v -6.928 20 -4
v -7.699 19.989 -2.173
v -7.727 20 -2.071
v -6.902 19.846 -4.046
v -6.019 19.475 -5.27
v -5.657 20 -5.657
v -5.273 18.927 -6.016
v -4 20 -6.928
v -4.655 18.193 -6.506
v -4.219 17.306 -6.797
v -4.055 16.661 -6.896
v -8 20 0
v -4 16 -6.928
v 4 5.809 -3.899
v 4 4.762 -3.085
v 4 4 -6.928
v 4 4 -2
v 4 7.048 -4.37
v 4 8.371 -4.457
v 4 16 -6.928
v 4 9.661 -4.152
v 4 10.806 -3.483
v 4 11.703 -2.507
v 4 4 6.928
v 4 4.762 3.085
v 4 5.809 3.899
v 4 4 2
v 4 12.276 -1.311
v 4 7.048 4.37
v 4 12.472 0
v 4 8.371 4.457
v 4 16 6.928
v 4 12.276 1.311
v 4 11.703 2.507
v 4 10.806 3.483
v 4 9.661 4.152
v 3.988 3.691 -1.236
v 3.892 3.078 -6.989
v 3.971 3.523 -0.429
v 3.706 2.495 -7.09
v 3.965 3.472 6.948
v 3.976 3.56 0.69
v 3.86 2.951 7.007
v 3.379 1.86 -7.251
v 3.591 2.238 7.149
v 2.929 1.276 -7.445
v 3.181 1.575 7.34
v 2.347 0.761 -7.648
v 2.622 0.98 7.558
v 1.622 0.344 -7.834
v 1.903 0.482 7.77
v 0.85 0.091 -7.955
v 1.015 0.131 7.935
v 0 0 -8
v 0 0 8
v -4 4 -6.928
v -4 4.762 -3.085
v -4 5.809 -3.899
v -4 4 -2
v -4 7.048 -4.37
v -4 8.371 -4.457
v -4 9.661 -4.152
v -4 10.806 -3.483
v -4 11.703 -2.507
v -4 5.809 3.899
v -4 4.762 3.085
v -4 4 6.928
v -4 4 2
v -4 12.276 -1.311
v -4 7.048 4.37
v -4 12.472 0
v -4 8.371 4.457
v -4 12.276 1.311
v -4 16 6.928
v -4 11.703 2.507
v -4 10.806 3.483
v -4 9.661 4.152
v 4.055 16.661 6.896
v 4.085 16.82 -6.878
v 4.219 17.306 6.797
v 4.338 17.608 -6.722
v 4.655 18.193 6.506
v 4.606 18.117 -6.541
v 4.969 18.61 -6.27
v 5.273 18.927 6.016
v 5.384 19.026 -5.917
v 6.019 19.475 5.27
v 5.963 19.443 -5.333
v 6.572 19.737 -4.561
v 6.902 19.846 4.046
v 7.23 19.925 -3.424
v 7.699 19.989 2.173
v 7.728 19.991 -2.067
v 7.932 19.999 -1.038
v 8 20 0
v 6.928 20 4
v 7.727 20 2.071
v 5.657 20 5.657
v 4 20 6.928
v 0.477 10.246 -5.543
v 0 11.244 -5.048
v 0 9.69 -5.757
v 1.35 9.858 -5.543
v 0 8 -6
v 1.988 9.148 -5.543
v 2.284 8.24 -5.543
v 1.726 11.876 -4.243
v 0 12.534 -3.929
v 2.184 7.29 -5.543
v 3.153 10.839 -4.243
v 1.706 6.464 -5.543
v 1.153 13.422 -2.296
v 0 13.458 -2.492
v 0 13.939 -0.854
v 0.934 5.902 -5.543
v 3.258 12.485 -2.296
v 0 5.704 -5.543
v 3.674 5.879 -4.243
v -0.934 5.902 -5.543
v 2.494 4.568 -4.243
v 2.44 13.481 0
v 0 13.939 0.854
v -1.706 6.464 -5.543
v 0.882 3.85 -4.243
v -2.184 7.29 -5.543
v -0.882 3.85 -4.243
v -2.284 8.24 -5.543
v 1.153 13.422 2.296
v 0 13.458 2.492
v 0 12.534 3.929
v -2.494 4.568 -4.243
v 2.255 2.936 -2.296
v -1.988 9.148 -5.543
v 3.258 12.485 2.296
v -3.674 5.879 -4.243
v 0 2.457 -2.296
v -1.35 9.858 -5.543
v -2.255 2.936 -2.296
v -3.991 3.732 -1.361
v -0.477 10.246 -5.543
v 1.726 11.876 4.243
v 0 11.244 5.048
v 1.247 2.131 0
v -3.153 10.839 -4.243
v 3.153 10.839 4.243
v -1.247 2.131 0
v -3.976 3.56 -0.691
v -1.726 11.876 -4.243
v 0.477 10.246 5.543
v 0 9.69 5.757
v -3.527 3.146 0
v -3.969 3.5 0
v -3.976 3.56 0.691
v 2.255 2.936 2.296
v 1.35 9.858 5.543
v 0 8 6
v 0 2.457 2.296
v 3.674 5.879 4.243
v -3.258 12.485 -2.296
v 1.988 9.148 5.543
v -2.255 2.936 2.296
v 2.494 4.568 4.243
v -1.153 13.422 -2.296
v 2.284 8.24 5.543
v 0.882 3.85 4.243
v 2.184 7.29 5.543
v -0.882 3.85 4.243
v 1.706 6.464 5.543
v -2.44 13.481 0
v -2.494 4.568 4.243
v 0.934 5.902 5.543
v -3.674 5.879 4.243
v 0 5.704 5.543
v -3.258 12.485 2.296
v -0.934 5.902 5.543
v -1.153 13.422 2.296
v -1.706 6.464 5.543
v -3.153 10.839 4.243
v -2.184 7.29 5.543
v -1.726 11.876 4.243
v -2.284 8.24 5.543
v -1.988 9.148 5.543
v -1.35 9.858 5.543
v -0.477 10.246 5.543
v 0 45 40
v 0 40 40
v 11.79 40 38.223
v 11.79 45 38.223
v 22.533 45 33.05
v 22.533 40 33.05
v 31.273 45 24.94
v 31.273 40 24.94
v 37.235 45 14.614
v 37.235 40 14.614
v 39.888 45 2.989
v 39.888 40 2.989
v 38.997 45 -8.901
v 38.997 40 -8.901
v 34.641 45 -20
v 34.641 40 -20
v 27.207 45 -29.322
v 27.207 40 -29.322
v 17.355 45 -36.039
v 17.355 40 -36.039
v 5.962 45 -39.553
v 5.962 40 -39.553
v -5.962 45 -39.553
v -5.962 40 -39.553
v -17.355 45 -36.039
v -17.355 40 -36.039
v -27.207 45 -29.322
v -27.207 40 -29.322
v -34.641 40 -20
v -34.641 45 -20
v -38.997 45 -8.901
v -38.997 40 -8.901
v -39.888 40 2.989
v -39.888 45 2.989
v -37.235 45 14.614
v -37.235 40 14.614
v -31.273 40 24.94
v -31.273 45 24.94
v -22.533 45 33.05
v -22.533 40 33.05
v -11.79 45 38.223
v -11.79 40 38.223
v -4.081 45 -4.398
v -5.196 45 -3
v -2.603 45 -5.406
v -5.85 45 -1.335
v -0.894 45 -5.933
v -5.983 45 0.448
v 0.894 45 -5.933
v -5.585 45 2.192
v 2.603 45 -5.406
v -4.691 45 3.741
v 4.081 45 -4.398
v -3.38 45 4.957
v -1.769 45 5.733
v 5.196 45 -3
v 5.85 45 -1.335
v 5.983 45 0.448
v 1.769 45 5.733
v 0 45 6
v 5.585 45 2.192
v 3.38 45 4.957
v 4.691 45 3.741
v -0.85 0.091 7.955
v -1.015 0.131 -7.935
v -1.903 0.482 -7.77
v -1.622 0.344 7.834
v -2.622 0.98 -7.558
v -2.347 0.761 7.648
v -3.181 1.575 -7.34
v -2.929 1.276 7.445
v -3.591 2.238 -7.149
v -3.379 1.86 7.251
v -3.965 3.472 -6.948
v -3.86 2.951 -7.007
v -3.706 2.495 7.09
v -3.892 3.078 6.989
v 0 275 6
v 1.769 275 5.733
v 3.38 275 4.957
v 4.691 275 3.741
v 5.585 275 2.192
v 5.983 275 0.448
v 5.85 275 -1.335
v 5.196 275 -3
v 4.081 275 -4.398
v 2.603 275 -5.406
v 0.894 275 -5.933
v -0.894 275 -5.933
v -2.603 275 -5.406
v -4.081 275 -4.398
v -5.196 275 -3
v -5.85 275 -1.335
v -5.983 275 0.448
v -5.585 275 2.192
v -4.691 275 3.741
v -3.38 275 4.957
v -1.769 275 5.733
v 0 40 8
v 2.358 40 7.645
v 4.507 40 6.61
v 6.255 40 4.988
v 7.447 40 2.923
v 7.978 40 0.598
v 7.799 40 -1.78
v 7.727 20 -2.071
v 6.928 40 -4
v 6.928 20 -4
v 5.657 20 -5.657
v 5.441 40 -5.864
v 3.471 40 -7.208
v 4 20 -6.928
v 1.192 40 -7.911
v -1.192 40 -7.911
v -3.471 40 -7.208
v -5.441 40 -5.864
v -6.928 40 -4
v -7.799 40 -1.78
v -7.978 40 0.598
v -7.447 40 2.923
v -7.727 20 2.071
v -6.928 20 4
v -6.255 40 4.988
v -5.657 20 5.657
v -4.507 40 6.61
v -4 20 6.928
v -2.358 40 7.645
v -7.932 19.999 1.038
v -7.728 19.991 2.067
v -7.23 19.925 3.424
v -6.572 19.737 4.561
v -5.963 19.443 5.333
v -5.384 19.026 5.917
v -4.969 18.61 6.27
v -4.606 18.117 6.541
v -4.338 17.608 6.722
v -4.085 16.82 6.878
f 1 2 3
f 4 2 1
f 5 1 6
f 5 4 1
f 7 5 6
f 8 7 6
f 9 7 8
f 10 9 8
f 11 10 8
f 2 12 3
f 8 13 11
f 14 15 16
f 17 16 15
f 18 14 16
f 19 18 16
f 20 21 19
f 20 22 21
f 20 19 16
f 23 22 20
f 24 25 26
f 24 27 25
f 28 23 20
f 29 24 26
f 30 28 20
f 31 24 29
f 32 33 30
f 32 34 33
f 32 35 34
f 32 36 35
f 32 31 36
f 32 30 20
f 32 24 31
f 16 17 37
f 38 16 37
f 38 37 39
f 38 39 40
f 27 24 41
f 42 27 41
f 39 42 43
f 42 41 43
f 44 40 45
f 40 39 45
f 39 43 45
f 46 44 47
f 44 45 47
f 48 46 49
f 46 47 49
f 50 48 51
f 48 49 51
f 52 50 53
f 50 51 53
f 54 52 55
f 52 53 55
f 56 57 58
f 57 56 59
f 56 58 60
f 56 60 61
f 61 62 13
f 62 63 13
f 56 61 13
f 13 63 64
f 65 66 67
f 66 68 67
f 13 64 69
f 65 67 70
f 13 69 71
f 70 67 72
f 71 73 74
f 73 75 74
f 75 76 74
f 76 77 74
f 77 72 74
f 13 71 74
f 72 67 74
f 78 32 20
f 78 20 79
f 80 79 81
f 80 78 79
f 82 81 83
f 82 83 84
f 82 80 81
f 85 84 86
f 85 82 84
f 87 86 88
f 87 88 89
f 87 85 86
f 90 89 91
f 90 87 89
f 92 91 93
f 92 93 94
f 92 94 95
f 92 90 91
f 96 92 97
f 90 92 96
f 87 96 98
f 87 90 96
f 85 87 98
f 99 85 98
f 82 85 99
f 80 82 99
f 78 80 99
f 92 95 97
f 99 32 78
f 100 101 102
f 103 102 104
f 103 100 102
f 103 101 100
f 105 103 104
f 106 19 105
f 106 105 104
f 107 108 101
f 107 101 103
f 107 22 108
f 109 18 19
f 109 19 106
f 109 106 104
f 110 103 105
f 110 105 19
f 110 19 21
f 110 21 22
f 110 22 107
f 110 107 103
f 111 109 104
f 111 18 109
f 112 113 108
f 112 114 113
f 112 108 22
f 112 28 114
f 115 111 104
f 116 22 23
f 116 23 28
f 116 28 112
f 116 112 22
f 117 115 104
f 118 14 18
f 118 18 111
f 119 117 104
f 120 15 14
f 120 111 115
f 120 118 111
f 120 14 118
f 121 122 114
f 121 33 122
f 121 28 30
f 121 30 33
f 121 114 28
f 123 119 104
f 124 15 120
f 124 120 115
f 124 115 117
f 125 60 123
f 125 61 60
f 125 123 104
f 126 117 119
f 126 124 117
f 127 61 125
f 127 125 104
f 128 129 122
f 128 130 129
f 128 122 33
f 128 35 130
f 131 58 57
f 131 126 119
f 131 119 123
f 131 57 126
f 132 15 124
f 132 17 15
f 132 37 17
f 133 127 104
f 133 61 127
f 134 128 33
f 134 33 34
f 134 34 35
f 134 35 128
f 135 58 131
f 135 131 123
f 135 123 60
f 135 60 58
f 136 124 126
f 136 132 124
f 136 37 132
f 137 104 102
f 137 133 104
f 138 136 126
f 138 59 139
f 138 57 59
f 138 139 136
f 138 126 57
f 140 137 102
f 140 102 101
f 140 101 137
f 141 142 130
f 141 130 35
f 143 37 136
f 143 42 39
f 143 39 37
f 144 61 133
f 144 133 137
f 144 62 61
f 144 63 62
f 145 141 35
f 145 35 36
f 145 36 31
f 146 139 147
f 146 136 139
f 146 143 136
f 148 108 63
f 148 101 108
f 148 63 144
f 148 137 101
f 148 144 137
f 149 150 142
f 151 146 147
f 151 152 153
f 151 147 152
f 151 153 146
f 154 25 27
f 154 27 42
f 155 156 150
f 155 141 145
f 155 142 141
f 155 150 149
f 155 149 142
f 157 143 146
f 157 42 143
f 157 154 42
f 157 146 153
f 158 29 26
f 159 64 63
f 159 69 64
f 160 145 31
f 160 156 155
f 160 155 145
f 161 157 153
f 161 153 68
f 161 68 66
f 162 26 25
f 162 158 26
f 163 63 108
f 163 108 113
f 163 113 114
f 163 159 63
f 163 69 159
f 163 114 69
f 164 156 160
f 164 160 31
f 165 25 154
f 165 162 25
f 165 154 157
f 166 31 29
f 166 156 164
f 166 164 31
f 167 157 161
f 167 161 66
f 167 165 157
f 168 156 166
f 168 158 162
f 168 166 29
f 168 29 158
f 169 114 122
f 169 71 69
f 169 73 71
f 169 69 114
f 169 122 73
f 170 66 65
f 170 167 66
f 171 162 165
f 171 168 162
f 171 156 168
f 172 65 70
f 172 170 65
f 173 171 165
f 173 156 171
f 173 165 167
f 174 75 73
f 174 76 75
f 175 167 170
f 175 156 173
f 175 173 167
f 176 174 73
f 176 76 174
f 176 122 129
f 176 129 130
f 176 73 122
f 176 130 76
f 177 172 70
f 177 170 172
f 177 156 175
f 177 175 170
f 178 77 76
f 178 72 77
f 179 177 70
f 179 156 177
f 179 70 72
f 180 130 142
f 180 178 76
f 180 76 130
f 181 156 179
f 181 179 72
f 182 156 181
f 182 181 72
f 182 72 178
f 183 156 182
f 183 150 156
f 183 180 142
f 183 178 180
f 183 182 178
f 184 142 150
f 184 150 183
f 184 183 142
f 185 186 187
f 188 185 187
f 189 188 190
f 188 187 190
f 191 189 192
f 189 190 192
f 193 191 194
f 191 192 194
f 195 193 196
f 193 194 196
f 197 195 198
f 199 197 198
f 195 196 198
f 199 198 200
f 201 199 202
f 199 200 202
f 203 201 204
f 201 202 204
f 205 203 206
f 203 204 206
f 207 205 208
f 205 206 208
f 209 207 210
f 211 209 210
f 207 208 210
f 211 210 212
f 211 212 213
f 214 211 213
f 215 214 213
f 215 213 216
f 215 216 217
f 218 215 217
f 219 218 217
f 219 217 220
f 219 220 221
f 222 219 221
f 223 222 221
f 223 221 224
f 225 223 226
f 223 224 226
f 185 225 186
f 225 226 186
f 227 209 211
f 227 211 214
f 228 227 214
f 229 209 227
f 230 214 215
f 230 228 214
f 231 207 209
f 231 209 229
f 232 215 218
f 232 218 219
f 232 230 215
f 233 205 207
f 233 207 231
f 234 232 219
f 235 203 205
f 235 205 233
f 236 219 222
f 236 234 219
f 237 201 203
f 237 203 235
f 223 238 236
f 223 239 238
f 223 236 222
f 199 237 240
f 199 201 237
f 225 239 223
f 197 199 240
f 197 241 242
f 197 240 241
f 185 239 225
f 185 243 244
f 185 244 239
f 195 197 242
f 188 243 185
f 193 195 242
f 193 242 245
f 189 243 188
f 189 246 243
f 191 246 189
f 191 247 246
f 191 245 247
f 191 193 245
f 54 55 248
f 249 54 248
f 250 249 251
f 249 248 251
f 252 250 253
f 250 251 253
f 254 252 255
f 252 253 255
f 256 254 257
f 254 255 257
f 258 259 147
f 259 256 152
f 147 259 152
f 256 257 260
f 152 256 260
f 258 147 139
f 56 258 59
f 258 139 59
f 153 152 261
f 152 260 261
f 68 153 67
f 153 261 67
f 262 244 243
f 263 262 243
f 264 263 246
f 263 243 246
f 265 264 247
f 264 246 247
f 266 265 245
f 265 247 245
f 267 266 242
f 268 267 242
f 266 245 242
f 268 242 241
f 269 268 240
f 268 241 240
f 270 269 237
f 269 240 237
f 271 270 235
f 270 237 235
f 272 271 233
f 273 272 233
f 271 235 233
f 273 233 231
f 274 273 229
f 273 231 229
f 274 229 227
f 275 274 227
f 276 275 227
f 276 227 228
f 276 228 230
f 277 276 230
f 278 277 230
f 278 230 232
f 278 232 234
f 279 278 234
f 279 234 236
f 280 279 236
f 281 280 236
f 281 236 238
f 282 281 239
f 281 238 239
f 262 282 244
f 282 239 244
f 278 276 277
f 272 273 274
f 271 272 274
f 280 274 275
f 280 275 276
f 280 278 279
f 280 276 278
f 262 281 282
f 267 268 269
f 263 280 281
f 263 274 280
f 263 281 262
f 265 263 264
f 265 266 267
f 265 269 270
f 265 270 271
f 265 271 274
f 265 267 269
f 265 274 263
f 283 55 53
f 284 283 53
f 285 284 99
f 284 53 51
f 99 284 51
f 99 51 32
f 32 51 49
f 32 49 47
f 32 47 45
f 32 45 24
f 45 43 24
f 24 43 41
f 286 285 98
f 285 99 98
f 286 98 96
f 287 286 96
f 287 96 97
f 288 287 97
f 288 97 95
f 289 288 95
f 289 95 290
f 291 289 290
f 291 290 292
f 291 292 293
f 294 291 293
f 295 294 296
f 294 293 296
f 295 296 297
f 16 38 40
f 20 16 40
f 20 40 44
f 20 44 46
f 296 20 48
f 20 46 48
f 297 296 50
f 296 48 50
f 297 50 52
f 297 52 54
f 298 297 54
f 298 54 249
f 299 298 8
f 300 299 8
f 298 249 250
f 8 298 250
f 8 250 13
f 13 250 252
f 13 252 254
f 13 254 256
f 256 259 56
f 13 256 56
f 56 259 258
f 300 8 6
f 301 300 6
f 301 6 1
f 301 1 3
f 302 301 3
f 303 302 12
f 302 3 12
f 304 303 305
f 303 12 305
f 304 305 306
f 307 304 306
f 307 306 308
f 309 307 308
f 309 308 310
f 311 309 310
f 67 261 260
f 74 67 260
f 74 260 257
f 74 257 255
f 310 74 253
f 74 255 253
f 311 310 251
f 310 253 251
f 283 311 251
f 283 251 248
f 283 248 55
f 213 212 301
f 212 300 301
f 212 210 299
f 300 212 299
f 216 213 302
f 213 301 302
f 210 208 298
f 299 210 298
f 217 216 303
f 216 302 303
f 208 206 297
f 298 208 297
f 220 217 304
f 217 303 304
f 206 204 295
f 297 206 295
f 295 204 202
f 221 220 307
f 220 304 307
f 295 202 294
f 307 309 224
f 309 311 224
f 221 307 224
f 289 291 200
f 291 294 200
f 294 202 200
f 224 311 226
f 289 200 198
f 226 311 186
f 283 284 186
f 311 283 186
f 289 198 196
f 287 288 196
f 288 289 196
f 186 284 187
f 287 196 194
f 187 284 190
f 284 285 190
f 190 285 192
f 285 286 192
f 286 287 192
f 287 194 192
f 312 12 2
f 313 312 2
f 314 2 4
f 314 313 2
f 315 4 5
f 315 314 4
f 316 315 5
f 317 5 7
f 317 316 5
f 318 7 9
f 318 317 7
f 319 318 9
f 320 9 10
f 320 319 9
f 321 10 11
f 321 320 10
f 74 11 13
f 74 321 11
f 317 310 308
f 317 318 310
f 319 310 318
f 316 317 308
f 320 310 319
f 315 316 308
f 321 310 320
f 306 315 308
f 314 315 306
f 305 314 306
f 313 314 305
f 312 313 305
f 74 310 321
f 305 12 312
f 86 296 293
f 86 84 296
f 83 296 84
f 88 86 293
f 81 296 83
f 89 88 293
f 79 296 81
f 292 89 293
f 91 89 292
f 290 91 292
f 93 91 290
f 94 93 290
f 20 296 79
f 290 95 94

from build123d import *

# Parameters (mm, degrees)
SCHIZZO1_R                   = 8
ESTRUSIONE_ESTRUSIONE1_DEPTH = 40
SCHIZZO2_R                   = 40
ESTRUSIONE_ESTRUSIONE2_DEPTH = 5
SCHIZZO3_R                   = 6
ESTRUSIONE_ESTRUSIONE3_DEPTH = 230
SCHIZZO4_W                   = 4
SCHIZZO4_H                   = 20
TAGLIO_ESTRUSIONE1_DEPTH     = 281.757902827
RACCORDO1_R                  = 4


with BuildPart() as part:
    # Schizzo1 → Estrusione-Estrusione1 (new body)
    with BuildSketch(Plane(origin=(0, 0, 0), x_dir=(1, 0, 0), z_dir=(0, 1, 0))):
        with Locations(Location((0, 0, 0), (0, 0, 270))):
            Circle(SCHIZZO1_R)
    extrude(amount=ESTRUSIONE_ESTRUSIONE1_DEPTH)

    # Schizzo2 → Estrusione-Estrusione2 (add)
    with BuildSketch(Plane(origin=(0, 40, 0), x_dir=(1, 0, 0), z_dir=(0, 1, 0))):
        with Locations(Location((0, 0, 0), (0, 0, 270))):
            Circle(SCHIZZO2_R)
    extrude(amount=ESTRUSIONE_ESTRUSIONE2_DEPTH)

    # Schizzo3 → Estrusione-Estrusione3 (add)
    with BuildSketch(Plane(origin=(0, 45, 0), x_dir=(1, 0, 0), z_dir=(0, 1, 0))):
        with Locations(Location((0, 0, 0), (0, 0, 270))):
            Circle(SCHIZZO3_R)
    extrude(amount=ESTRUSIONE_ESTRUSIONE3_DEPTH)

    # Schizzo4 → Taglio-Estrusione1 (cut, symmetric)
    with BuildSketch(Plane.XY):
        with Locations((6, 10)):
            Rectangle(SCHIZZO4_W, SCHIZZO4_H)
    taglio_estrusione1 = extrude(amount=TAGLIO_ESTRUSIONE1_DEPTH, both=True, mode=Mode.SUBTRACT)

    # Specchia1: Taglio-Estrusione1 across plane
    add(taglio_estrusione1.mirror(Plane(origin=(0, 0, 0), x_dir=(0, 0, 1), z_dir=(1, 0, 0))), mode=Mode.SUBTRACT)


with BuildPart() as body_2:
    # Schizzo5 → Rivoluzione1 (revolve)
    with BuildSketch(Plane(origin=(0, 0, 0), x_dir=(0, 0, -1), z_dir=(1, 0, 0))):
        with BuildLine():
            Line((-6, 8), (6, 8))
            ThreePointArc((6, 8), (0, 14), (-6, 8))
        make_face()
    revolve(axis=Axis((0, 8, 6), (0, 0, -1)))


with BuildPart() as part_1:
    add(part.part)

    # Abbina1: cut body 2
    add(body_2.part, mode=Mode.SUBTRACT)

    # Raccordo1
    # the kernel refuses this fillet: 4 mm, written as the material it adds along each edge
    with BuildSketch(Plane(origin=(4, 20, 16.92820323), x_dir=(0, -1, 0), z_dir=(0, 0, -1))) as raccordo1_piece_1_section:
        with BuildLine():
            CenterArc((RACCORDO1_R, -RACCORDO1_R), RACCORDO1_R, 90, 90)
            Line((0, -RACCORDO1_R), (0, 0))
            Line((0, 0), (RACCORDO1_R, 0))
        make_face()
    raccordo1_piece_1 = extrude(amount=33.856406461, mode=Mode.PRIVATE)
    raccordo1_piece_1 = raccordo1_piece_1 & Plane(origin=(0, 19.029808041, 0), x_dir=(0, 0, 1), z_dir=(0, -1, 0)) * Cylinder(8, 84, mode=Mode.PRIVATE)
    add(raccordo1_piece_1)
    with BuildSketch(Plane(origin=(-4, 20, 16.92820323), x_dir=(0, -1, 0), z_dir=(0, 0, -1))) as raccordo1_piece_2_section:
        with BuildLine():
            CenterArc((RACCORDO1_R, RACCORDO1_R), RACCORDO1_R, 180, 90)
            Line((0, RACCORDO1_R), (0, 0))
            Line((0, 0), (RACCORDO1_R, 0))
        make_face()
    raccordo1_piece_2 = extrude(amount=33.856406461, mode=Mode.PRIVATE)
    raccordo1_piece_2 = raccordo1_piece_2 & Plane(origin=(0, 19.029808041, 0), x_dir=(0, 0, 1), z_dir=(0, -1, 0)) * Cylinder(8, 84, mode=Mode.PRIVATE)
    add(raccordo1_piece_2)
    # the kernel refuses this fillet: 4 mm, written as the material it takes off along each edge
    with BuildSketch(Plane(origin=(-4, 0, 16.92820323), x_dir=(1, 0, 0), z_dir=(0, 0, -1))) as raccordo1_2_piece_1:
        with BuildLine():
            CenterArc((RACCORDO1_R, -RACCORDO1_R), RACCORDO1_R, 90, 90)
            Line((0, -RACCORDO1_R), (0, 0))
            Line((0, 0), (RACCORDO1_R, 0))
        make_face()
    extrude(amount=33.856406461, mode=Mode.SUBTRACT)
    with BuildSketch(Plane(origin=(4, 0, 16.92820323), x_dir=(-1, 0, 0), z_dir=(0, 0, -1))) as raccordo1_2_piece_2:
        with BuildLine():
            CenterArc((RACCORDO1_R, RACCORDO1_R), RACCORDO1_R, 180, 90)
            Line((0, RACCORDO1_R), (0, 0))
            Line((0, 0), (RACCORDO1_R, 0))
        make_face()
    extrude(amount=33.856406461, mode=Mode.SUBTRACT)


solid = part_1.part
